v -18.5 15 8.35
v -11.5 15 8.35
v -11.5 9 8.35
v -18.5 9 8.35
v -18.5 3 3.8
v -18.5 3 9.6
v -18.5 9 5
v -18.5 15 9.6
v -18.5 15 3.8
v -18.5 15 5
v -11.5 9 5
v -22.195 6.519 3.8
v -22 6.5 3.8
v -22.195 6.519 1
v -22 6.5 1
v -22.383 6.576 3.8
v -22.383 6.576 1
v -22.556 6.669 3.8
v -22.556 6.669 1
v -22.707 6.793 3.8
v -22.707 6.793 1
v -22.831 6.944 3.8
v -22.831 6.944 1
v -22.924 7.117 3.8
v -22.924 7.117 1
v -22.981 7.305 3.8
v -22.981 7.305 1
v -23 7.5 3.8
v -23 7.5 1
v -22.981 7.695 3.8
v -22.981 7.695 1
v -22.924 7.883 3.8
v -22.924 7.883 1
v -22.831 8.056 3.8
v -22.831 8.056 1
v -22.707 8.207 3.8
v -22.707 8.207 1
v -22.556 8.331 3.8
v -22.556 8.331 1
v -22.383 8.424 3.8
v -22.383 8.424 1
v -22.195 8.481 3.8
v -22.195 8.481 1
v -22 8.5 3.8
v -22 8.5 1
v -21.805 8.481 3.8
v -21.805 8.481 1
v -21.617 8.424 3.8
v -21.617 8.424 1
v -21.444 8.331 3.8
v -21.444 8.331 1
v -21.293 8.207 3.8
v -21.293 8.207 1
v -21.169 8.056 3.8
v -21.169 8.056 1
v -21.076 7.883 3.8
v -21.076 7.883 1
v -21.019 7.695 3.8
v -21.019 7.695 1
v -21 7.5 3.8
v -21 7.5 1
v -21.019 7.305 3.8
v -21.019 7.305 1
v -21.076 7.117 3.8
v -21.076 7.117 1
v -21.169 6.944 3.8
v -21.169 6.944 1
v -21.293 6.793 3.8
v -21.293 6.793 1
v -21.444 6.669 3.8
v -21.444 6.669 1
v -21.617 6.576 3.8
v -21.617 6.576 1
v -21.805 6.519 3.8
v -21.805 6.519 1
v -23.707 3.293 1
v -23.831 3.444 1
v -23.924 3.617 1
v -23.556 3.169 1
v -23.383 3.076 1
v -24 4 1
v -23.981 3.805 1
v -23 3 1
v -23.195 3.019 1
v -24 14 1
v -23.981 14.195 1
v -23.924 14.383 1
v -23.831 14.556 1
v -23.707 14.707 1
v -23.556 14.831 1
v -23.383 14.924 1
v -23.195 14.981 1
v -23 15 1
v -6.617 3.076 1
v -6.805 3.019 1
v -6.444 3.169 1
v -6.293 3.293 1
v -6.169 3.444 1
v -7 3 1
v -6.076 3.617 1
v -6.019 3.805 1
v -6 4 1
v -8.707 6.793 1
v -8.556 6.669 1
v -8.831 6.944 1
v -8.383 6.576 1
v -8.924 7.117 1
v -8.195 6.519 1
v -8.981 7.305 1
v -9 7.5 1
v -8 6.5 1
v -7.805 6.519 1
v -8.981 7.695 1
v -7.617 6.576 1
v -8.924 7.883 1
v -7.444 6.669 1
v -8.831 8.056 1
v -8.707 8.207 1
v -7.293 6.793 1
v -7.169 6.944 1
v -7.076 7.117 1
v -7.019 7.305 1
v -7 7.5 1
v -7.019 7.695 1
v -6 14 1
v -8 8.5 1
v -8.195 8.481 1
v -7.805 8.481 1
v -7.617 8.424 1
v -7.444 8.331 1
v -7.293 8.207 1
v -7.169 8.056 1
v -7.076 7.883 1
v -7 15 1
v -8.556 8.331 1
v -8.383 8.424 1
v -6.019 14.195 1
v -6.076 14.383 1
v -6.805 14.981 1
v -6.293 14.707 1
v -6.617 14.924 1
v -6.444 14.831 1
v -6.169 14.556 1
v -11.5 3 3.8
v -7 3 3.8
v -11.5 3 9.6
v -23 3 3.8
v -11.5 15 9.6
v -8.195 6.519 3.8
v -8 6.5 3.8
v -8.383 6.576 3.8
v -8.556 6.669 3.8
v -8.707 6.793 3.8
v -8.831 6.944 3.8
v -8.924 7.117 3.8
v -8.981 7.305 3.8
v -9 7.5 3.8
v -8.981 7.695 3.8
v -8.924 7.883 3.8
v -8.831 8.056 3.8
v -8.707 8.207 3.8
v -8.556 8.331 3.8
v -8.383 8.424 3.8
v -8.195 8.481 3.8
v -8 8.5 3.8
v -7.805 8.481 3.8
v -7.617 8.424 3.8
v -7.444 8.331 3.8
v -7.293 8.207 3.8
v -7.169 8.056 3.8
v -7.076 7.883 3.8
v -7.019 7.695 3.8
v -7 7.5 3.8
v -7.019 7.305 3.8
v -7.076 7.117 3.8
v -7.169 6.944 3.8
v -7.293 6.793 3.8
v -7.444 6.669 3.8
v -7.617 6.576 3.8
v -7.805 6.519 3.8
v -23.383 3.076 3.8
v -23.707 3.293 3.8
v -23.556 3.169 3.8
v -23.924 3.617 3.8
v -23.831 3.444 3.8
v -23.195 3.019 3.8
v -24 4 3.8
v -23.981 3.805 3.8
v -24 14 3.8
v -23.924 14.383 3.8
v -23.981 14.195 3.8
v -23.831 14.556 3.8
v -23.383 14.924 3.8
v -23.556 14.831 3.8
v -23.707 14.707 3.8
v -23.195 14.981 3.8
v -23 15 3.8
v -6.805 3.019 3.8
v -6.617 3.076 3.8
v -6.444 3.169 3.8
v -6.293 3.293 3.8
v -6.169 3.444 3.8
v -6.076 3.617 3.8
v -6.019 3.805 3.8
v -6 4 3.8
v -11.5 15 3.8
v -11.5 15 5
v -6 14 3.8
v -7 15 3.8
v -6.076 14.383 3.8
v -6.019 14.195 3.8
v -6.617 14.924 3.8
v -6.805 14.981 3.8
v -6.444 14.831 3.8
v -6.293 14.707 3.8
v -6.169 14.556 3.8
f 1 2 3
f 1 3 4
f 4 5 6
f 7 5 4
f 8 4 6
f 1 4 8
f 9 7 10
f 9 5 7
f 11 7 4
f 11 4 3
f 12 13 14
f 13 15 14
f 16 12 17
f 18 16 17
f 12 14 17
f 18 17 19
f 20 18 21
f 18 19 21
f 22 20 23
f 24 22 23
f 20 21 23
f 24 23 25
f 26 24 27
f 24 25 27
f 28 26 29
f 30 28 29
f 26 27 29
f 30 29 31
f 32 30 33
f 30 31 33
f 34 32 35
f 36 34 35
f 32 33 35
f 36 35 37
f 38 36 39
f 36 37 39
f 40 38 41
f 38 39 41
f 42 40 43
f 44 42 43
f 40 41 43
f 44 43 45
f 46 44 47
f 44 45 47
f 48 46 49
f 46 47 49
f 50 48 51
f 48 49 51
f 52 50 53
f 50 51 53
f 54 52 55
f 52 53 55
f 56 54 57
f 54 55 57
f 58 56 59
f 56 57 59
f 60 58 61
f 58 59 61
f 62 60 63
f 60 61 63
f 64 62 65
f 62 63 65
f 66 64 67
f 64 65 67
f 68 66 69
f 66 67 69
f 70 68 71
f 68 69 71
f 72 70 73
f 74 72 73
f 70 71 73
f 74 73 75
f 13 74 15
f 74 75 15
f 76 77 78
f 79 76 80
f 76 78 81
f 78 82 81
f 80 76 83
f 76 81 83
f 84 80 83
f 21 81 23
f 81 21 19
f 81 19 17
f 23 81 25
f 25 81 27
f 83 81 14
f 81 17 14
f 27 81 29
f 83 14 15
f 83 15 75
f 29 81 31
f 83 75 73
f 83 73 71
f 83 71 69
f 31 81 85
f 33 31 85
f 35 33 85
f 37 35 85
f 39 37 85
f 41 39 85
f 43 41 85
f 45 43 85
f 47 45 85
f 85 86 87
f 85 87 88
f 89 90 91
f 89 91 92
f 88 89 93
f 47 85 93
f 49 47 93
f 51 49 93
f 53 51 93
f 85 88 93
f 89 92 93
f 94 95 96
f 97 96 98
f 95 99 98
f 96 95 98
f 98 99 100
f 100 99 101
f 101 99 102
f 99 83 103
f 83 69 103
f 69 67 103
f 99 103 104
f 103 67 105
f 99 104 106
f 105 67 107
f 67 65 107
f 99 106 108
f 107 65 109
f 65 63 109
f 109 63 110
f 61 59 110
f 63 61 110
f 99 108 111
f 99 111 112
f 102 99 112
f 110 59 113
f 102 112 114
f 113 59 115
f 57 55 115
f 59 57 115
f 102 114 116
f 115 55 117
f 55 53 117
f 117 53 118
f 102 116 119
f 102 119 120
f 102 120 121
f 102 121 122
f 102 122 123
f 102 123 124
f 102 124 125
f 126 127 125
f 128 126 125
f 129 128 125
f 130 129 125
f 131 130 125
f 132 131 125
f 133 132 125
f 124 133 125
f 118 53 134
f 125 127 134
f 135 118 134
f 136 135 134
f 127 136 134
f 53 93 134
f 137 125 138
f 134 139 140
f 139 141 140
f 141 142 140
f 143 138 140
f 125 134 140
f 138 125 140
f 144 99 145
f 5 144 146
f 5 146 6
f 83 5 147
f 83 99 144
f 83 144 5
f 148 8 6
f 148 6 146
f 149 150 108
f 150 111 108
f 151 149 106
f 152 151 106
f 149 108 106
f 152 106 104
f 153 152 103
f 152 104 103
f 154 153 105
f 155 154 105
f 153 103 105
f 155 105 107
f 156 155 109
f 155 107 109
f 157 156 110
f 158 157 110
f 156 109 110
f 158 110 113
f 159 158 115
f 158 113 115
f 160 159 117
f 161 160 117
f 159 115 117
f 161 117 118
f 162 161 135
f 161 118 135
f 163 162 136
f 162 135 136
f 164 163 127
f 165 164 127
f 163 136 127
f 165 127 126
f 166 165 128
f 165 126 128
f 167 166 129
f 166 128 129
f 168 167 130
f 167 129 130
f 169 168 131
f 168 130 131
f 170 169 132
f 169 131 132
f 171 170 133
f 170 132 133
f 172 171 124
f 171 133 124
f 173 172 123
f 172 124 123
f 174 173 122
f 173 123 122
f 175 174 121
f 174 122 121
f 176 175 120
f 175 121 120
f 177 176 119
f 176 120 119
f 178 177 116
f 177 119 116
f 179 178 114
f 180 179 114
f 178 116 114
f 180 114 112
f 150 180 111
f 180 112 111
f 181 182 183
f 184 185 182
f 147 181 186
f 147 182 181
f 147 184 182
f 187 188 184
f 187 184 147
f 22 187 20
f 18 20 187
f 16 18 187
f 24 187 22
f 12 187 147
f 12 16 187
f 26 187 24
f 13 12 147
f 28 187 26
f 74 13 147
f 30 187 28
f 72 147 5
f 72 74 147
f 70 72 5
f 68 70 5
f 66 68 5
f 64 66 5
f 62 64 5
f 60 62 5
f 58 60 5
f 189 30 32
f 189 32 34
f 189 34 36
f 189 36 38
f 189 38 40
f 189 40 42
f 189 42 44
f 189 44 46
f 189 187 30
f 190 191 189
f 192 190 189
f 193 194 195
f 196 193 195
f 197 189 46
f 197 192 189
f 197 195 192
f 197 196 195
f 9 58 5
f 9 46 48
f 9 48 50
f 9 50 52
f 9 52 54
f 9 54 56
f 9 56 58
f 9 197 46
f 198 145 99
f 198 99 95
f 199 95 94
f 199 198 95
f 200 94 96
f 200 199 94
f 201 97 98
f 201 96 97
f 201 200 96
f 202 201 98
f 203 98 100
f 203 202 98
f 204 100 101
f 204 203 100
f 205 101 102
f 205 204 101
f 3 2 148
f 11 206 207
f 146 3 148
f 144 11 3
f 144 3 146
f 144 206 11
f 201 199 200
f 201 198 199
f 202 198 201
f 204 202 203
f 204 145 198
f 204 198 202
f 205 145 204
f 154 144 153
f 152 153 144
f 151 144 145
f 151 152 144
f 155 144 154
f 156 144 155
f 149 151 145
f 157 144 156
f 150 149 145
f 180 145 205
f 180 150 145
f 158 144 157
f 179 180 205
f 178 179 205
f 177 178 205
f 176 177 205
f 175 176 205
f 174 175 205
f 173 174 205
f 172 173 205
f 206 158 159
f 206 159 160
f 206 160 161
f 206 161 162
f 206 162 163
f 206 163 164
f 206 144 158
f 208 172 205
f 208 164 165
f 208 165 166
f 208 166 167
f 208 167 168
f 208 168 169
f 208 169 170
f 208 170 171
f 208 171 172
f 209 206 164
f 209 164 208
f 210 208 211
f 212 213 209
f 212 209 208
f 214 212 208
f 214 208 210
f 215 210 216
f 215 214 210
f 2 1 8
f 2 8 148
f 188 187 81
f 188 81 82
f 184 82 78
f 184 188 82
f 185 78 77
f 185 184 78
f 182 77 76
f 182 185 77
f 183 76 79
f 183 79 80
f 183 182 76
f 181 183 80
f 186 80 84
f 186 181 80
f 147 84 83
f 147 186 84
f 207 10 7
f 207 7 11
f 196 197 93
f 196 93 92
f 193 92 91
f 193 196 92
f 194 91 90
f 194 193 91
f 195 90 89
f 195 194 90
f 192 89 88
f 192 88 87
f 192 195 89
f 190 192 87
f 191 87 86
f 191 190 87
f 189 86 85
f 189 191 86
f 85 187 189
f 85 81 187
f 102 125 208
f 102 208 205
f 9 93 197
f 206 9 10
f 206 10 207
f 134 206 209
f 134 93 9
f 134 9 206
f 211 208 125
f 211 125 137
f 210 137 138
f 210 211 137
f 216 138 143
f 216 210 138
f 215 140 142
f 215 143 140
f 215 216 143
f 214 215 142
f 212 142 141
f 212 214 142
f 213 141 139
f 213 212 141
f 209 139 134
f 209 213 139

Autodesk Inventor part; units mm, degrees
ref_plane "YZ Plane" through (0, 0, 0) normal (1, 0, 0) x (0, 1, 0)
ref_plane "XZ Plane" through (0, 0, 0) normal (0, 1, 0) x (-1, 0, 0)
ref_plane "XY Plane" through (0, 0, 0) normal (0, 0, 1) x (1, 0, 0)
sketch "Sketch1" plane through (0, 0, 0) normal (0, 0, 1) x (1, 0, 0)
  point P0 (0, 0)
sketch "Sketch2" plane through (0, 0, 0) normal (0, 0, 1) x (1, 0, 0)
  line L0 (0, 0) -> (-34, 0)
  line L1 (-34, 0) -> (-34, 15)
  line L2 (-34, 15) -> (0, 15)
  line L3 (0, 15) -> (0, 0)
  dimension "d0" = 34
  dimension "d1" = 15
extrude "Extrusion1" add sketch "Sketch2" along normal blind 1
sketch "Sketch3" plane through (0, 0, 1) normal (0, 0, 1) x (1, 0, 0)
  line L0 (0, 0) -> (0, 15) projected
  point P0 (-8, 7.5)
  point P1 (-22, 7.5)
  dimension "d4" = 14
  dimension "d5" = 8
hole "Hole1" at (-22, 7.5, 1) at (-8, 7.5, 1) direction (0, 0, -1) diameter 4.5 end through all
sketch "Sketch4" plane through (0, 0, 1) normal (0, 0, 1) x (1, 0, 0)
  line L0 (-24, 15) -> (-6, 15)
  line L1 (-6, 15) -> (-6, 3)
  line L2 (-6, 3) -> (-24, 3)
  line L3 (-24, 3) -> (-24, 15)
  line L4 (0, 0) -> (0, 15) projected
  dimension "d13" = 18
  dimension "d14" = 12
  dimension "d15" = 6
extrude "Extrusion2" add sketch "Sketch4" along normal blind 2.8
sketch "Sketch6" plane through (0, 0, 3.8) normal (0, 0, 1) x (1, 0, 0)
  arc A0 (-24, 6.4692) -> (-24, 8.5308) centre (-22, 7.5) ccw projected
  arc A1 (-6, 8.5308) -> (-6, 6.4692) centre (-8, 7.5) ccw projected
  point P0 (0, 0)
hole "Hole2" at (-8, 7.5, 3.8) at (-22, 7.5, 3.8) direction (0, 0, -1) diameter 2 end through all
sketch "Sketch5" plane through (0, 0, 3.8) normal (0, 0, 1) x (1, 0, 0)
  line L0 (-34, 15) -> (0, 15) projected
  line L1 (-18.5, 15) -> (-11.5, 15)
  line L2 (-11.5, 15) -> (-11.5, 3)
  line L3 (-11.5, 3) -> (-18.5, 3)
  line L4 (-18.5, 3) -> (-18.5, 15)
  line L5 (-24, 15) -> (-24, 3) projected
  line L6 (-6, 3) -> (-6, 15) projected
  point P0 (0, 0)
  dimension "d18" = 7
  dimension "d19" = 0
  dimension "d20" = 5.5
  dimension "d21" = 5.5
extrude "Extrusion3" add sketch "Sketch5" along normal blind 5.8
sketch "Sketch7" plane through (-34, 15, 0) normal (0, 1, 0) x (1, 0, 0)
  line L0 (0, 0) -> (34, 0) projected
  line L1 (0, 0) -> (0, -1) projected
  line L2 (10, -1) -> (0, -1) projected
  line L3 (10, -1) -> (10, -3.8) projected
  line L4 (15.5, -3.8) -> (10, -3.8) projected
  line L5 (15.5, -3.8) -> (15.5, -9.6) projected
  line L6 (22.5, -9.6) -> (15.5, -9.6) projected
  line L7 (22.5, -3.8) -> (22.5, -9.6) projected
  line L8 (28, -3.8) -> (22.5, -3.8) projected
  line L9 (28, -1) -> (28, -3.8) projected
  line L10 (34, -1) -> (28, -1) projected
  line L11 (34, 0) -> (34, -1) projected
  line L12 (15.5, -3.8) -> (15.5, -9.6) projected
  line L13 (22.5, -8.35) -> (15.5, -8.35)
  line L14 (15.5, -8.35) -> (15.5, -5)
  line L15 (15.5, -5) -> (22.5, -5)
  line L16 (22.5, -5) -> (22.5, -8.35)
  dimension "d31" = 5
  dimension "d32" = 1.25
extrude "Extrusion4" cut sketch "Sketch7" against normal blind 6 contours L15 L7 L13 L5
sketch "Sketch8" plane through (0, 0, 1) normal (0, 0, 1) x (1, 0, 0)
  point P0 (0, 0)
fillet "Fillet1" radius 1 8 edges at (-34, 0, 0.5) (0, 0, 0.5) (0, 15, 0.5) (-34, 15, 0.5) (-6, 15, 2.4) (-6, 3, 2.4) (-24, 15, 2.4) (-24, 3, 2.4)
move faces "Move1" translate (0, 0, 1) faces at (-18.4872, 1.7718, 0)
properties part number "Z-linear-encoder"
